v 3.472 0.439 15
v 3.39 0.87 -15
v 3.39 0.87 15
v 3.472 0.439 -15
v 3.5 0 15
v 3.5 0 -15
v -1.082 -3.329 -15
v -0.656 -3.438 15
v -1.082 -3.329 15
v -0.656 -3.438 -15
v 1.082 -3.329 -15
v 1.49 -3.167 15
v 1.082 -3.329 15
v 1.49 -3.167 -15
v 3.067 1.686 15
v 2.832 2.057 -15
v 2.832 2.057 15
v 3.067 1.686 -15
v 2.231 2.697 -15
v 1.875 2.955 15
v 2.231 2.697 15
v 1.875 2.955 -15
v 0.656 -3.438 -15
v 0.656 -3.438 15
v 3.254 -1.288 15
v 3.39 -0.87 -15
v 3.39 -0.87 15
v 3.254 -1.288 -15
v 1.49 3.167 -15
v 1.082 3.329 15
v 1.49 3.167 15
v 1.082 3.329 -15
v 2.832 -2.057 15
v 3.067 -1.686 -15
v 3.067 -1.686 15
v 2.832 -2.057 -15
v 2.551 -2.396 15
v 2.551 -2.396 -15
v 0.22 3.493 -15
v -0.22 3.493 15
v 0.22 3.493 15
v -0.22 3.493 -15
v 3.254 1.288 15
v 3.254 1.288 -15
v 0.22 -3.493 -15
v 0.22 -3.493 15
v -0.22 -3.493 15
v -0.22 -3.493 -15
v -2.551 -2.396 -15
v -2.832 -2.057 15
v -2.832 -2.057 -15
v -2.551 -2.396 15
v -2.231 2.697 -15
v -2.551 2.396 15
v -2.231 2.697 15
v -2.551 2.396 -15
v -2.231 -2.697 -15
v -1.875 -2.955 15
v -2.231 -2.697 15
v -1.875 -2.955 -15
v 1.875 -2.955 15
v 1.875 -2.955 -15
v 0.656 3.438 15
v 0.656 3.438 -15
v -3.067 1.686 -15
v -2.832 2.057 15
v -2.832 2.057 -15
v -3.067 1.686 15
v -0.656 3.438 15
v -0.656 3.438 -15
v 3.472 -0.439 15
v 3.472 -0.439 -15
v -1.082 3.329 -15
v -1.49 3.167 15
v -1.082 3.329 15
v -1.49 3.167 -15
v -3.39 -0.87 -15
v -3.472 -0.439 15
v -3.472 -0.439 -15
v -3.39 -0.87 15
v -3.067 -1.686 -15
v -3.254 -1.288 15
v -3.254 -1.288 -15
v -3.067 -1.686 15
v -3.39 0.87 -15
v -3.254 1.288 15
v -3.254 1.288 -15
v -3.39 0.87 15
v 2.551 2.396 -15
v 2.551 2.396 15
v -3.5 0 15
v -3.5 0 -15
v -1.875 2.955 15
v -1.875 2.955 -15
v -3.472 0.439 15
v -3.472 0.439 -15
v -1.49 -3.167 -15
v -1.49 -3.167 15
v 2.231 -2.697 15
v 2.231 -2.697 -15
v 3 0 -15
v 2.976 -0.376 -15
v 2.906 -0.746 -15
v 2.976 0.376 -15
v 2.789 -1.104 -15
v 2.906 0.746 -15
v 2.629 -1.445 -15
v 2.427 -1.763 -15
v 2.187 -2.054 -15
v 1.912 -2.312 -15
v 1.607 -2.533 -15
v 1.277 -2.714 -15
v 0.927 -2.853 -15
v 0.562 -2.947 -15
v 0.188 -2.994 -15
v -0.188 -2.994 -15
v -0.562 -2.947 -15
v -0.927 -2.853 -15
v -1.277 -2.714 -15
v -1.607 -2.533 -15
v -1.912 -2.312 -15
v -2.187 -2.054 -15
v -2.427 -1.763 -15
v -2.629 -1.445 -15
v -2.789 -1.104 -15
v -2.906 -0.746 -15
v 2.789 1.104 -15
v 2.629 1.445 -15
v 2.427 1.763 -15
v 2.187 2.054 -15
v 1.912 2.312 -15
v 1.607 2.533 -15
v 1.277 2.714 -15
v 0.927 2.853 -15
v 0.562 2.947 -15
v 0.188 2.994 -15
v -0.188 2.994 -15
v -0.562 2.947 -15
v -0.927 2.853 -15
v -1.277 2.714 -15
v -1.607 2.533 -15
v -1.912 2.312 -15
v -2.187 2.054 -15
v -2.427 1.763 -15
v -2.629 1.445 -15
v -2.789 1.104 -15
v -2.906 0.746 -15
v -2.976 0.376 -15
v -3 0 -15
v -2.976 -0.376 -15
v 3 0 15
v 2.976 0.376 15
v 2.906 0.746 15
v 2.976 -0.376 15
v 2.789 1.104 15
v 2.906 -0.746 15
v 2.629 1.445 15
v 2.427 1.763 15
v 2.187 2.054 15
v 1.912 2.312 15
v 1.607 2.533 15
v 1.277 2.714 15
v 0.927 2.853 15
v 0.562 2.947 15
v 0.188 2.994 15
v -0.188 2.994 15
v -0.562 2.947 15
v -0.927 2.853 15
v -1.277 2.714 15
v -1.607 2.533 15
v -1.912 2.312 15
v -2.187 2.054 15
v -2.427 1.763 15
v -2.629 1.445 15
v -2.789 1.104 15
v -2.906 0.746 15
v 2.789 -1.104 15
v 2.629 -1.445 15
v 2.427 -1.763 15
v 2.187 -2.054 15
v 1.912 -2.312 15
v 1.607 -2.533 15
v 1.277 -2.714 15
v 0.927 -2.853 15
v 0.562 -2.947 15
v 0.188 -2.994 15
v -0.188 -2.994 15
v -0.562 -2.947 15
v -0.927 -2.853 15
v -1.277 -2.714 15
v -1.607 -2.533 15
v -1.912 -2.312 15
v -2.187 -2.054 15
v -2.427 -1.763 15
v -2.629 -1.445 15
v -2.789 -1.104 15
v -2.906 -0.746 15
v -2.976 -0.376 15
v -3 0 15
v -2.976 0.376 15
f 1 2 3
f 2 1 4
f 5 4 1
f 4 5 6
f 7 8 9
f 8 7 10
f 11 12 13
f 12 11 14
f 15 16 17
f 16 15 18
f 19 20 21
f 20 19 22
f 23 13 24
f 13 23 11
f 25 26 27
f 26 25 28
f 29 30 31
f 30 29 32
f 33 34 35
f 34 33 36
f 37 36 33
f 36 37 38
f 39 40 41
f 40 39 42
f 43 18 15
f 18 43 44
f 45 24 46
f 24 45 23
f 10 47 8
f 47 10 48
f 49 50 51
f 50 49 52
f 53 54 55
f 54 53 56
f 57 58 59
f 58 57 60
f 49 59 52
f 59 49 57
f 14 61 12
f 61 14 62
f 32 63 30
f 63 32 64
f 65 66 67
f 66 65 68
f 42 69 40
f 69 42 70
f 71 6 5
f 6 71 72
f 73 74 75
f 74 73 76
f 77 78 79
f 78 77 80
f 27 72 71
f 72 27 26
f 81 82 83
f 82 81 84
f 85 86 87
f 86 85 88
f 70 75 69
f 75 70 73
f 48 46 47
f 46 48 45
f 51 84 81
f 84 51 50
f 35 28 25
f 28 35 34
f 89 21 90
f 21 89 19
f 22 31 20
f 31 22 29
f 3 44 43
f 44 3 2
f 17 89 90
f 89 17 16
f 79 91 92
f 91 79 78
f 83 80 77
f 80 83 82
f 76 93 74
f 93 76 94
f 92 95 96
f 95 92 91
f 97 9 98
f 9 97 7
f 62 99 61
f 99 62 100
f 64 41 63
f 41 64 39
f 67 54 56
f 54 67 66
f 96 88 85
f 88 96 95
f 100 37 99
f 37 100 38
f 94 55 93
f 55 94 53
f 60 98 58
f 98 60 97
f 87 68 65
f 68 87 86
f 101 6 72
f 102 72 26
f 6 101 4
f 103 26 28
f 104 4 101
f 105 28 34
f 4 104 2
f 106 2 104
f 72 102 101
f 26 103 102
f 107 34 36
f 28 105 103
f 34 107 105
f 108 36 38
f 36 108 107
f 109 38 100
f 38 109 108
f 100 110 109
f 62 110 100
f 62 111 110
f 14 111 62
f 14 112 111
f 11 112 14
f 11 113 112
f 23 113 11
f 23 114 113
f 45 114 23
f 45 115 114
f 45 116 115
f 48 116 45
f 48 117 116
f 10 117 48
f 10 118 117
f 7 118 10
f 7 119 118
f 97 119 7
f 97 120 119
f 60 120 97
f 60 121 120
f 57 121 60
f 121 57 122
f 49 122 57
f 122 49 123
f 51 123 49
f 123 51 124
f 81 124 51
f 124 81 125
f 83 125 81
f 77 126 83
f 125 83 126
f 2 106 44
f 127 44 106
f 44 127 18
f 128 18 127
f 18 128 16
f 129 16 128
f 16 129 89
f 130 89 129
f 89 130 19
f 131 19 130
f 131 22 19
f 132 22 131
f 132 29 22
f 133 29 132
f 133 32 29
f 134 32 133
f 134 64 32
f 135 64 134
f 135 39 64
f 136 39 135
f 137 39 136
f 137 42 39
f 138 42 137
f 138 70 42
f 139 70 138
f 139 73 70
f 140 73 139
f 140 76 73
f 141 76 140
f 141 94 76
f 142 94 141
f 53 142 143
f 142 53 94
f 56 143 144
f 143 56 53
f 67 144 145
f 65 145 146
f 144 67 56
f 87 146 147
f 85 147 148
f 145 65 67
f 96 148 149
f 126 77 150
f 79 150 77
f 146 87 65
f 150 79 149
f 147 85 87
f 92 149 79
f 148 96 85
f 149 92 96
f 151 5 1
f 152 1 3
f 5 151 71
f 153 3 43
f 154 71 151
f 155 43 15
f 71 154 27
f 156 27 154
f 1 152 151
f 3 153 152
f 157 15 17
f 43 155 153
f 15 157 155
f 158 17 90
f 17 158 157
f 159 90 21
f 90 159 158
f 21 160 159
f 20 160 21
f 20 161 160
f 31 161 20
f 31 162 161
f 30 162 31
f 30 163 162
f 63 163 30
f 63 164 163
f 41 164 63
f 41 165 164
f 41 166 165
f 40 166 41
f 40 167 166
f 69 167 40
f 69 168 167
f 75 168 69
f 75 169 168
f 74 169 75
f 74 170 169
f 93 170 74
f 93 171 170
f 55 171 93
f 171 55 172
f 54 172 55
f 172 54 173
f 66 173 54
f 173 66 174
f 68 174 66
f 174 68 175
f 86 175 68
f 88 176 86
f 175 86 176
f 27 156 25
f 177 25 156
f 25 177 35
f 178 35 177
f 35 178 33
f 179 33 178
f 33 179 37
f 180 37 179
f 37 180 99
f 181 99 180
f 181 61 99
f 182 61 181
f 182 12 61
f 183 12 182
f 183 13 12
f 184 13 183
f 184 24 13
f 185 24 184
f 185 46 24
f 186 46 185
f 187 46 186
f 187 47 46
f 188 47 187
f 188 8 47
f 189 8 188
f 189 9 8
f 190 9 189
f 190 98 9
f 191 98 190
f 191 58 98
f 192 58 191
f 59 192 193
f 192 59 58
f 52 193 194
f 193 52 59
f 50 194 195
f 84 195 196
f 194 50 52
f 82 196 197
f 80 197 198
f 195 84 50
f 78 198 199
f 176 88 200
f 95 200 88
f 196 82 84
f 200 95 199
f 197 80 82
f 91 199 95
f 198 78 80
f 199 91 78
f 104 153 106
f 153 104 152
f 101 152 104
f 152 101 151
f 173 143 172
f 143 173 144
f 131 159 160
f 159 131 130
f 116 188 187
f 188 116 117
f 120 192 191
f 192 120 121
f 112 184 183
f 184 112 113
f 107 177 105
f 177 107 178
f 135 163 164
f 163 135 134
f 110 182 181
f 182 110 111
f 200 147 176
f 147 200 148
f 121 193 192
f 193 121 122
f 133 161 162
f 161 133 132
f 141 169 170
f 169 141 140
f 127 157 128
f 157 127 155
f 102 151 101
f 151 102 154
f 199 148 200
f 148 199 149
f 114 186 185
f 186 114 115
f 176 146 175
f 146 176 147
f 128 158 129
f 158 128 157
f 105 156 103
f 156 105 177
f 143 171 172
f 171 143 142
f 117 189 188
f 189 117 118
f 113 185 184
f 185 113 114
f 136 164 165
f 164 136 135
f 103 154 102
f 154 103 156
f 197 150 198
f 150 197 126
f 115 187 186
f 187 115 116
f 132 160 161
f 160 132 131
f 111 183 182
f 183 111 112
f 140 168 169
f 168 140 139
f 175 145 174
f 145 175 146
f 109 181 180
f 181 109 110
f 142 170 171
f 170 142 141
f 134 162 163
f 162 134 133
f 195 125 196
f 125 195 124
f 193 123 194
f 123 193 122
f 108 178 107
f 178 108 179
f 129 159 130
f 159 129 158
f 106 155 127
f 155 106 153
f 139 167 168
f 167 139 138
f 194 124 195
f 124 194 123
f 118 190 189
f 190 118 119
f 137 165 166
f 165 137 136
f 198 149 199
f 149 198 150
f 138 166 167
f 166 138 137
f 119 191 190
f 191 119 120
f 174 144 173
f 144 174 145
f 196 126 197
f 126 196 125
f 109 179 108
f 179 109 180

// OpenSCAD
$fn = 50;


difference() {
	union() {
		translate(v = [0, 0, -15.0000000000]) {
			cylinder(h = 30, r = 3.5000000000);
		}
	}
	union() {
		translate(v = [0, 0, -100.0000000000]) {
			cylinder(h = 200, r = 3.0000000000);
		}
	}
}
